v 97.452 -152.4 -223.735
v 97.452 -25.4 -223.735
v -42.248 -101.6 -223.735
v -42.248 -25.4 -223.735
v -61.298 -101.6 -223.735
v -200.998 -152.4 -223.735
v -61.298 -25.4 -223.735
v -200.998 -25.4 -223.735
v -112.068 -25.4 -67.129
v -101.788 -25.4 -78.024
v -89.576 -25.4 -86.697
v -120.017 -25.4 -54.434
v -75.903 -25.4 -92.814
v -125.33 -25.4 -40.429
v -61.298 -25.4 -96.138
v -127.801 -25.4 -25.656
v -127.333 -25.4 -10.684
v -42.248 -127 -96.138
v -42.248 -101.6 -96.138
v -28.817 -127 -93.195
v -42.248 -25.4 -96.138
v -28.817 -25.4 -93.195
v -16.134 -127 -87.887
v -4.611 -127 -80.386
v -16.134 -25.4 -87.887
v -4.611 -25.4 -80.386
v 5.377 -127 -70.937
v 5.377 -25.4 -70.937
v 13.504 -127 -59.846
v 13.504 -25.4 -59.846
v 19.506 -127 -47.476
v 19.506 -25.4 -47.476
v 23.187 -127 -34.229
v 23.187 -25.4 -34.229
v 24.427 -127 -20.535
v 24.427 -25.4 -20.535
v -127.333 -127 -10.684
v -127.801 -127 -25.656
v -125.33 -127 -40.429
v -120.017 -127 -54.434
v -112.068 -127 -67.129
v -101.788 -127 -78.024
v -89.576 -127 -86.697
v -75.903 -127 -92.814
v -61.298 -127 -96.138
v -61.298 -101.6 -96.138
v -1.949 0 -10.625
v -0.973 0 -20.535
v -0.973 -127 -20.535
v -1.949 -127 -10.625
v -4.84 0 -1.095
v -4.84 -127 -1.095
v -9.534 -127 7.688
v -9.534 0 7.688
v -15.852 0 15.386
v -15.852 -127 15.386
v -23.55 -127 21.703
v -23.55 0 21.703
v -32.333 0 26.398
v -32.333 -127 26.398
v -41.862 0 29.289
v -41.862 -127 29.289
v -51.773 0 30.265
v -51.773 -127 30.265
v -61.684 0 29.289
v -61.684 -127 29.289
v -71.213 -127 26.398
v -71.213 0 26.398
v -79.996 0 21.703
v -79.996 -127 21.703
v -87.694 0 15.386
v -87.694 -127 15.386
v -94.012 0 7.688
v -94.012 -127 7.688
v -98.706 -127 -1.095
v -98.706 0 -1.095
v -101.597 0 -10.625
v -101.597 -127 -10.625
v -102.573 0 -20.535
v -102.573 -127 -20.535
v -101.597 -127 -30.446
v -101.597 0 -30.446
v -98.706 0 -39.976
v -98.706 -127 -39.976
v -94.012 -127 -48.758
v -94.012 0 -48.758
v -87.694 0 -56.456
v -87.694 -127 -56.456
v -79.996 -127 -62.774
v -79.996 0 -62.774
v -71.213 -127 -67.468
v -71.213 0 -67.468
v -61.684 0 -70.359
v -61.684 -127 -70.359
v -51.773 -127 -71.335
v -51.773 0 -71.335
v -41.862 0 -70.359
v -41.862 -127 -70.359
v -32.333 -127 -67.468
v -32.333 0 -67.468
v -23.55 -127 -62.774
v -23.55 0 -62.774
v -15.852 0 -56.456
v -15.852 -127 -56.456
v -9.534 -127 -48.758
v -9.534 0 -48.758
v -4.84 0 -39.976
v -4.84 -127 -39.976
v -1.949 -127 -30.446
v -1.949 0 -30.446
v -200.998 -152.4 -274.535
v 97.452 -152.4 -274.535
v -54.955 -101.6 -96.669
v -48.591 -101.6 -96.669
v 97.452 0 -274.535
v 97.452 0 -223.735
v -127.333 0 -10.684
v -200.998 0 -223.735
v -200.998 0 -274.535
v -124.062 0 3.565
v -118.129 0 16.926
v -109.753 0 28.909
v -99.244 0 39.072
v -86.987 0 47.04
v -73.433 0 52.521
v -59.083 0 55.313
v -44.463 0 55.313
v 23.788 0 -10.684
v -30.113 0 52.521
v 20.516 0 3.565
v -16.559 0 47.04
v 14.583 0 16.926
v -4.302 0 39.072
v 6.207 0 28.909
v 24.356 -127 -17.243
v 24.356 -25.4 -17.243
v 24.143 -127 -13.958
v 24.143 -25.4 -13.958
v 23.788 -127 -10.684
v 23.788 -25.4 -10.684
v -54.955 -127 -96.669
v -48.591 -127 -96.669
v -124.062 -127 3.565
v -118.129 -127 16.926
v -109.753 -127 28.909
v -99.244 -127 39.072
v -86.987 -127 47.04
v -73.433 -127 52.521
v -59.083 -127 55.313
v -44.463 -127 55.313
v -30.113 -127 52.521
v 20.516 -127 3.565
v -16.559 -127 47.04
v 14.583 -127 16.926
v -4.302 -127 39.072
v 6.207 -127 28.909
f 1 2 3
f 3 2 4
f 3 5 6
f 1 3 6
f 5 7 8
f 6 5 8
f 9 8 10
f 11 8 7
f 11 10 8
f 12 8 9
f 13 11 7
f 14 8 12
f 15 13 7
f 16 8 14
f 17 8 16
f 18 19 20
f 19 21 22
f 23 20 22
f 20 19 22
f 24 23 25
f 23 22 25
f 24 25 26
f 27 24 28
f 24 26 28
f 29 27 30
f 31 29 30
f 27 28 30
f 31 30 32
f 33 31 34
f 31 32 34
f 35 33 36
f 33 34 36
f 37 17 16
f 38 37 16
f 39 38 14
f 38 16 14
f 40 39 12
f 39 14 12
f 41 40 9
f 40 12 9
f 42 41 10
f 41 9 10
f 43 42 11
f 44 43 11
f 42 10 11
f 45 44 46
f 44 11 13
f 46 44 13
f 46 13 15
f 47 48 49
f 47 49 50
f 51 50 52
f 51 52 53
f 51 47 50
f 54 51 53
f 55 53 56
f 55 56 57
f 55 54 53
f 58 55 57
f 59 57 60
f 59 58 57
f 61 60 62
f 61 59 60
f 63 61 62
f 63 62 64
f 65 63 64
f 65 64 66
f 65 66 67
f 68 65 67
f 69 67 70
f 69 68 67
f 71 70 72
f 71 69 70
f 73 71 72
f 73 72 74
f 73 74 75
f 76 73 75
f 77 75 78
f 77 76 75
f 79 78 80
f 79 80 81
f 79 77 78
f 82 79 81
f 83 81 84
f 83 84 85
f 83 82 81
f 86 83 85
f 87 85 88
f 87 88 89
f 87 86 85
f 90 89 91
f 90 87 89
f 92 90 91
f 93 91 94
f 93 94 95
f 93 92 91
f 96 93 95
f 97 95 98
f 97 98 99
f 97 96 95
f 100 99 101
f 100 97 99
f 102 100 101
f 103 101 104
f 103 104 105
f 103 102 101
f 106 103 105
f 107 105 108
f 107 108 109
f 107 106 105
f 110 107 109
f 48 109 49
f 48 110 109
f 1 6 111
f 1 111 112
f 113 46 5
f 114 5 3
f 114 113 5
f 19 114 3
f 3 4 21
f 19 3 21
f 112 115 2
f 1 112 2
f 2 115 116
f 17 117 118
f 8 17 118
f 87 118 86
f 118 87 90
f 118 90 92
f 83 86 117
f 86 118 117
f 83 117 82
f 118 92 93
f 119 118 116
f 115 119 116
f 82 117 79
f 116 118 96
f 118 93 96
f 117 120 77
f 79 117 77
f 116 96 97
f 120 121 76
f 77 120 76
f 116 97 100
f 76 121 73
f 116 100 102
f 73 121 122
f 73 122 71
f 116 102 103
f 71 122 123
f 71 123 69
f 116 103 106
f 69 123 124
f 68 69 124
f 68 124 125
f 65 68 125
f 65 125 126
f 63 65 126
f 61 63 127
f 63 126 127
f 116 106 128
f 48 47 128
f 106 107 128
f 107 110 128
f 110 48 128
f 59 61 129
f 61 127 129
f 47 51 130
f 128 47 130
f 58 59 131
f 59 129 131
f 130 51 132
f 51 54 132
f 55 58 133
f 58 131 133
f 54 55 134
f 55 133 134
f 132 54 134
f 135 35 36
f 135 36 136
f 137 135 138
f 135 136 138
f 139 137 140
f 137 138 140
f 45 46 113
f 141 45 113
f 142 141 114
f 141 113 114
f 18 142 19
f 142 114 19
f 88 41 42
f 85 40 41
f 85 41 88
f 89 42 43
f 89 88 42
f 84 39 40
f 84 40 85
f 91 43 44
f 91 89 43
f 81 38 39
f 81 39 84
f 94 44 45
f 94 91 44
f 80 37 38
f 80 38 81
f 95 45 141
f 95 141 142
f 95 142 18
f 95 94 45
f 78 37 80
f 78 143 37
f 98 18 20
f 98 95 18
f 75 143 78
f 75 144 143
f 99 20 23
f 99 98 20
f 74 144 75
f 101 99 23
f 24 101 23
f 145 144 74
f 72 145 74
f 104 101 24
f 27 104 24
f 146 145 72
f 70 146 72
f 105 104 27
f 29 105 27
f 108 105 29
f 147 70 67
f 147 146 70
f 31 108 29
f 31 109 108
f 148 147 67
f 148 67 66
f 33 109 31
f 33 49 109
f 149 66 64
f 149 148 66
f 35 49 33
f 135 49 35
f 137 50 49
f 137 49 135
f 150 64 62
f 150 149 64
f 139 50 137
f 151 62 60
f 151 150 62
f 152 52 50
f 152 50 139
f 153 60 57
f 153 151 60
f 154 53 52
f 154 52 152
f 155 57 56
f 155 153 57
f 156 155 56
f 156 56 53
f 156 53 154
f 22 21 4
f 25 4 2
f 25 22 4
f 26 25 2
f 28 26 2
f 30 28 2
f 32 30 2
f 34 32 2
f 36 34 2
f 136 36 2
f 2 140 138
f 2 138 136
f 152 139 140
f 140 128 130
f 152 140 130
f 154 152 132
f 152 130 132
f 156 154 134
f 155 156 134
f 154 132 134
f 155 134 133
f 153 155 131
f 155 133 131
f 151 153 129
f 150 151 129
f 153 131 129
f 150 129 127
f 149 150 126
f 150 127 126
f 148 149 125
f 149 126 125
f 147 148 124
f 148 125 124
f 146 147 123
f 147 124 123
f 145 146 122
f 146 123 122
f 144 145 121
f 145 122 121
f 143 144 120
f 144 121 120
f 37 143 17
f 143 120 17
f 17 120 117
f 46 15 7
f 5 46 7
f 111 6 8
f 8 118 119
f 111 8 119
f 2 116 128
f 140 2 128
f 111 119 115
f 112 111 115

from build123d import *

# Parameters (mm, degrees)
F0_R     = 50.8
F1_DEPTH = 127
F2_DEPTH = 101.6
F3_DEPTH = 152.4
F4_DEPTH = 25.4


with BuildPart() as f1:
    # F0 (on Front) → F1 (new body)
    with BuildSketch(Plane.XZ):
        with BuildLine():
            ThreePointArc((-42.247934, -96.137584), (5.377066, -70.936803), (24.427066, -20.53524))
            ThreePointArc((24.427066, -20.53524), (24.267038, -15.599377), (23.787624, -10.684245))
            ThreePointArc((23.787624, -10.684245), (-51.772934, 55.66476), (-127.333492, -10.684245))
            ThreePointArc((-127.333492, -10.684245), (-112.067679, -67.129056), (-61.297934, -96.137584))
            ThreePointArc((-61.297934, -96.137584), (-51.772934, -96.73524), (-42.247934, -96.137584))
        make_face()
        with Locations((-51.772934, -20.53524)):
            Circle(F0_R, mode=Mode.SUBTRACT)
    extrude(amount=F1_DEPTH)

    # F0 (on Front) → F2 (join)
    with BuildSketch(Plane.XZ):
        with BuildLine():
            Line((-42.247934, -223.73524), (-42.247934, -96.137584))
            ThreePointArc((-42.247934, -96.137584), (-51.772934, -96.73524), (-61.297934, -96.137584))
            Line((-61.297934, -96.137584), (-61.297934, -223.73524))
            Line((-61.297934, -223.73524), (-42.247934, -223.73524))
        make_face()
    extrude(amount=F2_DEPTH)

    # F0 (on Front) → F3 (join)
    with BuildSketch(Plane.XZ):
        Polygon((97.452066, -274.53524), (97.452066, -223.73524), (-42.247934, -223.73524), (-61.297934, -223.73524), (-200.997934, -223.73524), (-200.997934, -274.53524), align=None)
    extrude(amount=F3_DEPTH)

    # F0 (on Front) → F4 (join)
    with BuildSketch(Plane.XZ):
        with BuildLine():
            ThreePointArc((-61.297934, -96.137584), (-112.067679, -67.129056), (-127.333492, -10.684245))
            Line((-127.333492, -10.684245), (-200.997934, -223.73524))
            Line((-200.997934, -223.73524), (-61.297934, -223.73524))
            Line((-61.297934, -223.73524), (-61.297934, -96.137584))
        make_face()
        with BuildLine():
            ThreePointArc((23.787624, -10.684245), (24.267038, -15.599377), (24.427066, -20.53524))
            ThreePointArc((24.427066, -20.53524), (5.377066, -70.936803), (-42.247934, -96.137584))
            Line((-42.247934, -96.137584), (-42.247934, -223.73524))
            Line((-42.247934, -223.73524), (97.452066, -223.73524))
            Line((97.452066, -223.73524), (23.787624, -10.684245))
        make_face()
    extrude(amount=F4_DEPTH)


solid = f1.part
